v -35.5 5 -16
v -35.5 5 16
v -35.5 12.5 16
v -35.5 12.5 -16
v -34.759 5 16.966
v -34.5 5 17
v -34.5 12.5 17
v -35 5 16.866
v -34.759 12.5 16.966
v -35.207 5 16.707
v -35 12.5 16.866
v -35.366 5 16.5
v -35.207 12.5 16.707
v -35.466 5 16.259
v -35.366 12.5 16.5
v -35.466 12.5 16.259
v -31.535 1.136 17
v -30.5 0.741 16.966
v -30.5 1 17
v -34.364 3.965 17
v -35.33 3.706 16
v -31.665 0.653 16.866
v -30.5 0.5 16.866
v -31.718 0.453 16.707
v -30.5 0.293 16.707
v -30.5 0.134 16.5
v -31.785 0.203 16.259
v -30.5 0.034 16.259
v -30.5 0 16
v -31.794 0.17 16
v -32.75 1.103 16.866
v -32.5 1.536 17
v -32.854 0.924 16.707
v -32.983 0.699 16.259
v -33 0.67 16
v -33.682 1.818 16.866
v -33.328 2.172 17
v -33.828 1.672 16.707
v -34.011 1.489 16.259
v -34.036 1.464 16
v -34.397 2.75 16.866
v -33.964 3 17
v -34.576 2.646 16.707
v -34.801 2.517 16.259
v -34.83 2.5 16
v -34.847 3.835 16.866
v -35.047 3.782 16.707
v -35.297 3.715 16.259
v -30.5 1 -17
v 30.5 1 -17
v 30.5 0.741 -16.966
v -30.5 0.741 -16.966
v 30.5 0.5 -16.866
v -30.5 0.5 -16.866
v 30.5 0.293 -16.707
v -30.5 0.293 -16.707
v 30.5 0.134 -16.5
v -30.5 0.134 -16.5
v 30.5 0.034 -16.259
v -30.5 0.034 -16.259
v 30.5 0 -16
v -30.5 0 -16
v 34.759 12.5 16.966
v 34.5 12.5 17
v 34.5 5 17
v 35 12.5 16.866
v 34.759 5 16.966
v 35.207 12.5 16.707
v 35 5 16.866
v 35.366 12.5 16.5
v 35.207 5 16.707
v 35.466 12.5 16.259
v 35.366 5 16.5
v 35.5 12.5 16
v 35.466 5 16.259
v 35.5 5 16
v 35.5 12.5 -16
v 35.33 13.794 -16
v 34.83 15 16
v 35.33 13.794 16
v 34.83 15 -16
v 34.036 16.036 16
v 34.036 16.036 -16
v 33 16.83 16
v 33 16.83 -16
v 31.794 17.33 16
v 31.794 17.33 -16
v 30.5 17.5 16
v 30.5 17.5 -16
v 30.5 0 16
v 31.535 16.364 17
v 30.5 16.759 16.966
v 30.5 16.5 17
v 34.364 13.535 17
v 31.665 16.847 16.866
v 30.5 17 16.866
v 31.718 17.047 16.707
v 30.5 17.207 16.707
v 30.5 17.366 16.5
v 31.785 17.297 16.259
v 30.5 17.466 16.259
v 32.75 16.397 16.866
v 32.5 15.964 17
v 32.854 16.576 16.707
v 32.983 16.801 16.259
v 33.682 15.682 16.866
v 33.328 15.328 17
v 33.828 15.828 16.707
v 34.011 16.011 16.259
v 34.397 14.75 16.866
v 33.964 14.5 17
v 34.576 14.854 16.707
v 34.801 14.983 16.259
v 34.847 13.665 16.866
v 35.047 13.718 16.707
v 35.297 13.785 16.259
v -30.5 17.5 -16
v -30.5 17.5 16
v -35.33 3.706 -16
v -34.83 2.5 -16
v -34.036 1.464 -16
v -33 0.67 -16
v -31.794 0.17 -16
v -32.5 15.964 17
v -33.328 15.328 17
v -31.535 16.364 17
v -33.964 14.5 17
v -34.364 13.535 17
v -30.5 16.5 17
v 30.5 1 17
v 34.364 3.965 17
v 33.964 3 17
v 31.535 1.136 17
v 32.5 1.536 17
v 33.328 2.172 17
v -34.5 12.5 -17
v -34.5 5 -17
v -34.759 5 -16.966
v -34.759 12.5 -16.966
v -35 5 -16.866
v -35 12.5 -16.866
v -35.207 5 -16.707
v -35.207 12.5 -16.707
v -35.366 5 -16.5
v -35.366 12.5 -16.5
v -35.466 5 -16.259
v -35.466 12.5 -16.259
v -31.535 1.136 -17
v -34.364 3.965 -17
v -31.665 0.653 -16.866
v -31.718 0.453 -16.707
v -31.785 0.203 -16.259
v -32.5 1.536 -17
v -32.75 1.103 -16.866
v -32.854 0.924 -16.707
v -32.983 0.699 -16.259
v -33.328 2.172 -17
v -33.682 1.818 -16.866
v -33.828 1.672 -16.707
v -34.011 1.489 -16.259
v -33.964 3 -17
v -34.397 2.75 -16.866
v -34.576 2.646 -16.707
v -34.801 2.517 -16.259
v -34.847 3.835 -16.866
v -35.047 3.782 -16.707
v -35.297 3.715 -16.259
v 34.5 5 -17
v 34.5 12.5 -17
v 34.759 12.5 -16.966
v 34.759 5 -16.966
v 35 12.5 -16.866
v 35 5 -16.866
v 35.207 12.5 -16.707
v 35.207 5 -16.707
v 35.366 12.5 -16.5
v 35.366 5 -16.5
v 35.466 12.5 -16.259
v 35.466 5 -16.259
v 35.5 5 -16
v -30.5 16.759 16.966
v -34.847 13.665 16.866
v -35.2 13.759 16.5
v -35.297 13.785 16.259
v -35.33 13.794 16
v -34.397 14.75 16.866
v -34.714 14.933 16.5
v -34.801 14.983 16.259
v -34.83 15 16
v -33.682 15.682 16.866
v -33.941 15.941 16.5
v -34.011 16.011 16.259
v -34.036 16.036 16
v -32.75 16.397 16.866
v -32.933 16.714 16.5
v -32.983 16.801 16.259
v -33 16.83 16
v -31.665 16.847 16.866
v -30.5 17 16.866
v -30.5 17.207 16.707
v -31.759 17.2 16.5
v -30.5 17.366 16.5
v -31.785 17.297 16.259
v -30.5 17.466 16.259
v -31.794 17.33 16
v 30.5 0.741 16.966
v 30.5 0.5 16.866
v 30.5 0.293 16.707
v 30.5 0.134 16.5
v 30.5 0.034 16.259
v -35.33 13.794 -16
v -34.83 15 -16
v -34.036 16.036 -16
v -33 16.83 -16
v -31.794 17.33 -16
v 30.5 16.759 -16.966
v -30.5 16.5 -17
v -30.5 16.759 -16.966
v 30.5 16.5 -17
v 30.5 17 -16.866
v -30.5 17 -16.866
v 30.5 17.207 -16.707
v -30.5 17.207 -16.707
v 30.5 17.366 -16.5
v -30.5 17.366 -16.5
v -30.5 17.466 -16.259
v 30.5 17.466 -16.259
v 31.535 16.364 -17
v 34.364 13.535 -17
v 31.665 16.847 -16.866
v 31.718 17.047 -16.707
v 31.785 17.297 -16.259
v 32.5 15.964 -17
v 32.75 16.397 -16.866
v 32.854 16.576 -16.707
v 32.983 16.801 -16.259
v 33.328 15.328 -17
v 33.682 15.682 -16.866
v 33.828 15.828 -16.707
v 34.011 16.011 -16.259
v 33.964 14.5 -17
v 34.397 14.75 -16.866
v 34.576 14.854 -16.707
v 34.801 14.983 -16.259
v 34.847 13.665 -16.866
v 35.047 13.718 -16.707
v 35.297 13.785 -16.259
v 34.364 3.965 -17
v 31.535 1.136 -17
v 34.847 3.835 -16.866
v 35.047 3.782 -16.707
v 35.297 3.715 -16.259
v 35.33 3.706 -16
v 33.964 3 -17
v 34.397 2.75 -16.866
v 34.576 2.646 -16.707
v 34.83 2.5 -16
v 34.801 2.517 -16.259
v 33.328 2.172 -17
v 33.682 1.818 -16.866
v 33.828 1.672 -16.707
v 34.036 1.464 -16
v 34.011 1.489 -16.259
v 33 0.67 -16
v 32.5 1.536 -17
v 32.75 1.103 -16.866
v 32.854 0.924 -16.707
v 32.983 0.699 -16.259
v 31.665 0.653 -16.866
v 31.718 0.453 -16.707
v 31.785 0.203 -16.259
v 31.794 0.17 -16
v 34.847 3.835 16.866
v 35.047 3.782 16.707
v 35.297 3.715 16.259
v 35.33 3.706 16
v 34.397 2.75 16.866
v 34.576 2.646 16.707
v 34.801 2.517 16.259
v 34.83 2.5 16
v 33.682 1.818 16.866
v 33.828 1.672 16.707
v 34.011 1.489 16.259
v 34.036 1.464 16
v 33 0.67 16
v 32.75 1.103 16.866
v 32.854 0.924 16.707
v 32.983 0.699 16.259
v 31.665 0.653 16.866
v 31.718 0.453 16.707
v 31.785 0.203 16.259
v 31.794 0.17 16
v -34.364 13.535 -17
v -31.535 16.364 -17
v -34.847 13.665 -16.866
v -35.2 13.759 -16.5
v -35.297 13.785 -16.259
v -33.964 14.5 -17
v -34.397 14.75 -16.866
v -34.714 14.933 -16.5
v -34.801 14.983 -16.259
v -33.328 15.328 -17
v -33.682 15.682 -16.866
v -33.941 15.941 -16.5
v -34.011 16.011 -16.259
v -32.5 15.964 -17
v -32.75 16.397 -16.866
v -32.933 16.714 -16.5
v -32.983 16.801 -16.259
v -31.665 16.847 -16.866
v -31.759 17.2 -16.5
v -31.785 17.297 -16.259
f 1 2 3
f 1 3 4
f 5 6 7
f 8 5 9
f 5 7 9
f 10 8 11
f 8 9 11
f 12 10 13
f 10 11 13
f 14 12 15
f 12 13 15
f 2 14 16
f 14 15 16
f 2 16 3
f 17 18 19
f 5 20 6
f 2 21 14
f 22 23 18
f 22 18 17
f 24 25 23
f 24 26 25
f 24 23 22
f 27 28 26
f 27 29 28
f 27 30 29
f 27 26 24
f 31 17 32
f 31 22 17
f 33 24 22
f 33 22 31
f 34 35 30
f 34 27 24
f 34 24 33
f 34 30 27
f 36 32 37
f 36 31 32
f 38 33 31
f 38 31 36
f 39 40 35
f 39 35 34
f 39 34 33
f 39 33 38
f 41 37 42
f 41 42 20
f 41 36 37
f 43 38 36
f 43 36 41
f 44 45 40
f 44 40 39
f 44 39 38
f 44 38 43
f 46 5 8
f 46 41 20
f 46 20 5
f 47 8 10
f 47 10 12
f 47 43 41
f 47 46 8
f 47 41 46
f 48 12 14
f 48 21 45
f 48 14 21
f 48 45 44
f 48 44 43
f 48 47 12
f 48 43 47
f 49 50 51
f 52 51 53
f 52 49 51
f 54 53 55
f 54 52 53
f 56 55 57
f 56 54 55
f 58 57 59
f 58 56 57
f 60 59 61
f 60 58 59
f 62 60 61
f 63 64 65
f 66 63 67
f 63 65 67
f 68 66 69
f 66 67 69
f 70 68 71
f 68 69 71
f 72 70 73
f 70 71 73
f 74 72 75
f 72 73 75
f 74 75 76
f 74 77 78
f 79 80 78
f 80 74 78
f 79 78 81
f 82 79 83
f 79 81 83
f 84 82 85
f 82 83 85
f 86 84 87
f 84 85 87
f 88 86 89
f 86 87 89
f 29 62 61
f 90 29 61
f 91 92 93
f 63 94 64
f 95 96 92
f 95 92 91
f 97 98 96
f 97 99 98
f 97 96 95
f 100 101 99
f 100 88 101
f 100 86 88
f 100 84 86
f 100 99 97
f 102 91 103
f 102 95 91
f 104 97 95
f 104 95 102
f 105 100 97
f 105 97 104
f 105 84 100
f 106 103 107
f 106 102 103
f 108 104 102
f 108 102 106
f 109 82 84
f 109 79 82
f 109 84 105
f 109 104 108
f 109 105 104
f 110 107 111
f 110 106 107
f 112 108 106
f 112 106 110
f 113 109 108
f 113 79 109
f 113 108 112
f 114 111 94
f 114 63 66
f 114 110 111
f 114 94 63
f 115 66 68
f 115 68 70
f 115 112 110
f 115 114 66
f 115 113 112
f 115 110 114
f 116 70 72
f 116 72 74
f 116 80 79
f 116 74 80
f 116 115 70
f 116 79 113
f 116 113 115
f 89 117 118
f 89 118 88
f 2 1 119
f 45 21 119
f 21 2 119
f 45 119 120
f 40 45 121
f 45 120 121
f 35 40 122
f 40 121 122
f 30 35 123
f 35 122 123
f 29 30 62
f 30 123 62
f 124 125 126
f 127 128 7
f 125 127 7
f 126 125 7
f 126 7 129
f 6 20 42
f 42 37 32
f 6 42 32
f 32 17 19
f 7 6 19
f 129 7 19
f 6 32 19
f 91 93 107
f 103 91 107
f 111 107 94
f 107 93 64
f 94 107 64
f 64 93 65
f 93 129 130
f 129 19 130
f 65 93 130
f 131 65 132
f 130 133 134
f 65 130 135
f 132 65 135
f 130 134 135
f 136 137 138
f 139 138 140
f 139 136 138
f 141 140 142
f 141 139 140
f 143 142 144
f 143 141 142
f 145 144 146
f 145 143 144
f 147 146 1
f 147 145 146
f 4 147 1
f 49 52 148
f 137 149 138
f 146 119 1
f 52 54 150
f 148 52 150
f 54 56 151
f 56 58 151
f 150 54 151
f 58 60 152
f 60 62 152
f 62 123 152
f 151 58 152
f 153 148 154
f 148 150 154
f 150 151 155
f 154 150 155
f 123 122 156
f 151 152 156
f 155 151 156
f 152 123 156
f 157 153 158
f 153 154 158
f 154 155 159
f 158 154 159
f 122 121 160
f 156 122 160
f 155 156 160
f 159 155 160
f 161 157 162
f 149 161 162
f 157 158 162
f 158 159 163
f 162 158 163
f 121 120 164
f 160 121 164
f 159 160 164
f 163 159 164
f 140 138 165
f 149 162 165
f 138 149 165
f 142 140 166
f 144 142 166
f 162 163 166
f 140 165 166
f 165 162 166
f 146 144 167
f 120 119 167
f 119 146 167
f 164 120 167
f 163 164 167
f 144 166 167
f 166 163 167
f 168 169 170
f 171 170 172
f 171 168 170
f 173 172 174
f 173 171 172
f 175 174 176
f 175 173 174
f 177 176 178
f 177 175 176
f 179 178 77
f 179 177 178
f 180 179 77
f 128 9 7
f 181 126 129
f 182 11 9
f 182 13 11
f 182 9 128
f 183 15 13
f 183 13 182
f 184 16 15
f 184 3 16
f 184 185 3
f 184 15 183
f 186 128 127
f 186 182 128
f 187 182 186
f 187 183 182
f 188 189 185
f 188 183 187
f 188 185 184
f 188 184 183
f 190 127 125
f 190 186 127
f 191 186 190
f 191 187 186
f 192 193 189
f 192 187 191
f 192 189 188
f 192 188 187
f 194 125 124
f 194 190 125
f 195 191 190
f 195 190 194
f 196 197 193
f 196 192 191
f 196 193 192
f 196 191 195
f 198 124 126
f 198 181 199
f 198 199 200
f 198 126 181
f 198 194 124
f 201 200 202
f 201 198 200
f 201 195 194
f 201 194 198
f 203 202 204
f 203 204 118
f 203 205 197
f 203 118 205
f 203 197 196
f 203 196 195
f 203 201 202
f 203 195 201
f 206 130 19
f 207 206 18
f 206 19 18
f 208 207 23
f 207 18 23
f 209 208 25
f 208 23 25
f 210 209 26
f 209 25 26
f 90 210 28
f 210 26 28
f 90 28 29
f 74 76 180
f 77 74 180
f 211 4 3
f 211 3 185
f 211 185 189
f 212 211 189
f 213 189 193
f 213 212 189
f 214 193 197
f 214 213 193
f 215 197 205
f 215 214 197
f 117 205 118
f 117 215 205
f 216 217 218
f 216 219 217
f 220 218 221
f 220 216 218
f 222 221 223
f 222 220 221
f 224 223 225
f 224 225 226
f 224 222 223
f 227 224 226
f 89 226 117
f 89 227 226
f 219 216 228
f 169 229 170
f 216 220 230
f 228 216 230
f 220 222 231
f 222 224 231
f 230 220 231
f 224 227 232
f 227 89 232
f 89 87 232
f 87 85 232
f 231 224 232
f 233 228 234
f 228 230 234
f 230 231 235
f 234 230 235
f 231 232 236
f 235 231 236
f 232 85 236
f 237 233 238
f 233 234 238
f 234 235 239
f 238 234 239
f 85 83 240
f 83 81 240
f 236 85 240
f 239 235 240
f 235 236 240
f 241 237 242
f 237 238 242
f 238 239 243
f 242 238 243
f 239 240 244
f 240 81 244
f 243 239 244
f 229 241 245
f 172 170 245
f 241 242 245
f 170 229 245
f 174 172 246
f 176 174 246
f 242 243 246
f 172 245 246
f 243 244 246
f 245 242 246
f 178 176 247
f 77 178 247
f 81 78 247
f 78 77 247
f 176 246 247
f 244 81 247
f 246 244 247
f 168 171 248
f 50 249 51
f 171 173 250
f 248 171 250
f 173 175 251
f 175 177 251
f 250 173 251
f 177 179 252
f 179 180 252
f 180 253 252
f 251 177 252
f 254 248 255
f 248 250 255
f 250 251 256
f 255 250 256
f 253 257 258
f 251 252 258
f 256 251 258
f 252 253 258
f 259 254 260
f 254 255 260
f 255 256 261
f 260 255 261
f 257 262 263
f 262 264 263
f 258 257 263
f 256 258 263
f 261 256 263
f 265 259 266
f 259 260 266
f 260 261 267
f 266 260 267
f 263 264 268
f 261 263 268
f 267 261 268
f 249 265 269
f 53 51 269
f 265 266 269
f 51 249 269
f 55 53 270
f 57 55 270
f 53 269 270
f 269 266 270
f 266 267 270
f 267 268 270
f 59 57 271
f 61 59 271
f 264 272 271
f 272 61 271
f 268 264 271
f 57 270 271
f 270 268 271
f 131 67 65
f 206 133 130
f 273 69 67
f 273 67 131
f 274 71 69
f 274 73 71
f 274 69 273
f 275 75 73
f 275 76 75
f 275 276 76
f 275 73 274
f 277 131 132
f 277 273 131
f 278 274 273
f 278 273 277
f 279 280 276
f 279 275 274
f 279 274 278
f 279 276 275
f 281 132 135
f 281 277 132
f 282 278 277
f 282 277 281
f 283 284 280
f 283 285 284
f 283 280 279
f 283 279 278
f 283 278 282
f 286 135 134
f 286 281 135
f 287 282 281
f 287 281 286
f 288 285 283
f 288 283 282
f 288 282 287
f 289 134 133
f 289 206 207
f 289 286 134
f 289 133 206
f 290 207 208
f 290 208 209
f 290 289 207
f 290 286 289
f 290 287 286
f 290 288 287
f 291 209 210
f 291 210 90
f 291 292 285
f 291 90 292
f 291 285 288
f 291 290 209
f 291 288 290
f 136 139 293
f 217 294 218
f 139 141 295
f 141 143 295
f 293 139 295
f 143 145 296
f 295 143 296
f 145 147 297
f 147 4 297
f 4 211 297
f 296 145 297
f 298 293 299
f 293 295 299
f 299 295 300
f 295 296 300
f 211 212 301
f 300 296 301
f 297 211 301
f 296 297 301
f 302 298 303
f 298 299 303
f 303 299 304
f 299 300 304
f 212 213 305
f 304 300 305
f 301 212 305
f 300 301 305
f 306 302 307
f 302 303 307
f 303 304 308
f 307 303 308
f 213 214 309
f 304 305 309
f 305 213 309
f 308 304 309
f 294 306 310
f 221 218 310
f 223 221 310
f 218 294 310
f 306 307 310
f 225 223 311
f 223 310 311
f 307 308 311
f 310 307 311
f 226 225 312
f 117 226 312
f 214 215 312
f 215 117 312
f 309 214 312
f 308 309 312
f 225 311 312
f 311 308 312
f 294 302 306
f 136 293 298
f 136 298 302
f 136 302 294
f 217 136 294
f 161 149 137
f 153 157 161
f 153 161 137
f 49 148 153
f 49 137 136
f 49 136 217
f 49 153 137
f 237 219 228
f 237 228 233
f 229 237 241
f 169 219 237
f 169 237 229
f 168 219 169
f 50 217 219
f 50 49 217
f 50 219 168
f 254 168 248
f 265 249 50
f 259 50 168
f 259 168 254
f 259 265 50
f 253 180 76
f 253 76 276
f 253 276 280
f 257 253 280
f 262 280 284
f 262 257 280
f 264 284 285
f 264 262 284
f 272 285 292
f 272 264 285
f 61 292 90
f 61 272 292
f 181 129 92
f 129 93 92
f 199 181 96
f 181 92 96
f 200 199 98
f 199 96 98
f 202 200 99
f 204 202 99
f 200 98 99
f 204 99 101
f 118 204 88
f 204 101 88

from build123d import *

# Parameters (mm, degrees)
SKETCH2_W           = 71
SKETCH2_H           = 34
BOSS_EXTRUDE1_DEPTH = 17.5
FILLET1_R           = 5
FILLET2_R           = 1


with BuildPart() as part:
    # Sketch2 → Boss-Extrude1 (new body)
    with BuildSketch(Plane(origin=(0, 0, 0), x_dir=(1, 0, 0), z_dir=(0, 1, 0))):
        Rectangle(SKETCH2_W, SKETCH2_H)
    extrude(amount=BOSS_EXTRUDE1_DEPTH)

    # Fillet1
    fillet1_edges = [part.edges().sort_by_distance(p)[0] for p in [
        (-35.5, 17.5, 0),
        (35.5, 17.5, 0),
        (-35.5, 0, 0),
        (35.5, 0, 0),
    ]]
    fillet(fillet1_edges, radius=FILLET1_R)

    # Fillet2
    fillet2_edges = [part.edges().sort_by_distance(p)[0] for p in [
        (0, 17.5, -17),
        (0, 17.5, 17),
        (0, 0, -17),
        (-35.5, 8.75, -17),
        (35.5, 8.75, -17),
        (-34.035533906, 16.035533906, -17),
        (-34.035533906, 1.464466094, -17),
        (34.035533906, 1.464466094, -17),
        (34.035533906, 16.035533906, -17),
        (35.5, 8.75, 17),
        (0, 0, 17),
        (-35.5, 8.75, 17),
        (-34.035533906, 16.035533906, 17),
        (-34.035533906, 1.464466094, 17),
        (34.035533906, 1.464466094, 17),
        (34.035533906, 16.035533906, 17),
    ]]
    fillet(fillet2_edges, radius=FILLET2_R)


solid = part.part
